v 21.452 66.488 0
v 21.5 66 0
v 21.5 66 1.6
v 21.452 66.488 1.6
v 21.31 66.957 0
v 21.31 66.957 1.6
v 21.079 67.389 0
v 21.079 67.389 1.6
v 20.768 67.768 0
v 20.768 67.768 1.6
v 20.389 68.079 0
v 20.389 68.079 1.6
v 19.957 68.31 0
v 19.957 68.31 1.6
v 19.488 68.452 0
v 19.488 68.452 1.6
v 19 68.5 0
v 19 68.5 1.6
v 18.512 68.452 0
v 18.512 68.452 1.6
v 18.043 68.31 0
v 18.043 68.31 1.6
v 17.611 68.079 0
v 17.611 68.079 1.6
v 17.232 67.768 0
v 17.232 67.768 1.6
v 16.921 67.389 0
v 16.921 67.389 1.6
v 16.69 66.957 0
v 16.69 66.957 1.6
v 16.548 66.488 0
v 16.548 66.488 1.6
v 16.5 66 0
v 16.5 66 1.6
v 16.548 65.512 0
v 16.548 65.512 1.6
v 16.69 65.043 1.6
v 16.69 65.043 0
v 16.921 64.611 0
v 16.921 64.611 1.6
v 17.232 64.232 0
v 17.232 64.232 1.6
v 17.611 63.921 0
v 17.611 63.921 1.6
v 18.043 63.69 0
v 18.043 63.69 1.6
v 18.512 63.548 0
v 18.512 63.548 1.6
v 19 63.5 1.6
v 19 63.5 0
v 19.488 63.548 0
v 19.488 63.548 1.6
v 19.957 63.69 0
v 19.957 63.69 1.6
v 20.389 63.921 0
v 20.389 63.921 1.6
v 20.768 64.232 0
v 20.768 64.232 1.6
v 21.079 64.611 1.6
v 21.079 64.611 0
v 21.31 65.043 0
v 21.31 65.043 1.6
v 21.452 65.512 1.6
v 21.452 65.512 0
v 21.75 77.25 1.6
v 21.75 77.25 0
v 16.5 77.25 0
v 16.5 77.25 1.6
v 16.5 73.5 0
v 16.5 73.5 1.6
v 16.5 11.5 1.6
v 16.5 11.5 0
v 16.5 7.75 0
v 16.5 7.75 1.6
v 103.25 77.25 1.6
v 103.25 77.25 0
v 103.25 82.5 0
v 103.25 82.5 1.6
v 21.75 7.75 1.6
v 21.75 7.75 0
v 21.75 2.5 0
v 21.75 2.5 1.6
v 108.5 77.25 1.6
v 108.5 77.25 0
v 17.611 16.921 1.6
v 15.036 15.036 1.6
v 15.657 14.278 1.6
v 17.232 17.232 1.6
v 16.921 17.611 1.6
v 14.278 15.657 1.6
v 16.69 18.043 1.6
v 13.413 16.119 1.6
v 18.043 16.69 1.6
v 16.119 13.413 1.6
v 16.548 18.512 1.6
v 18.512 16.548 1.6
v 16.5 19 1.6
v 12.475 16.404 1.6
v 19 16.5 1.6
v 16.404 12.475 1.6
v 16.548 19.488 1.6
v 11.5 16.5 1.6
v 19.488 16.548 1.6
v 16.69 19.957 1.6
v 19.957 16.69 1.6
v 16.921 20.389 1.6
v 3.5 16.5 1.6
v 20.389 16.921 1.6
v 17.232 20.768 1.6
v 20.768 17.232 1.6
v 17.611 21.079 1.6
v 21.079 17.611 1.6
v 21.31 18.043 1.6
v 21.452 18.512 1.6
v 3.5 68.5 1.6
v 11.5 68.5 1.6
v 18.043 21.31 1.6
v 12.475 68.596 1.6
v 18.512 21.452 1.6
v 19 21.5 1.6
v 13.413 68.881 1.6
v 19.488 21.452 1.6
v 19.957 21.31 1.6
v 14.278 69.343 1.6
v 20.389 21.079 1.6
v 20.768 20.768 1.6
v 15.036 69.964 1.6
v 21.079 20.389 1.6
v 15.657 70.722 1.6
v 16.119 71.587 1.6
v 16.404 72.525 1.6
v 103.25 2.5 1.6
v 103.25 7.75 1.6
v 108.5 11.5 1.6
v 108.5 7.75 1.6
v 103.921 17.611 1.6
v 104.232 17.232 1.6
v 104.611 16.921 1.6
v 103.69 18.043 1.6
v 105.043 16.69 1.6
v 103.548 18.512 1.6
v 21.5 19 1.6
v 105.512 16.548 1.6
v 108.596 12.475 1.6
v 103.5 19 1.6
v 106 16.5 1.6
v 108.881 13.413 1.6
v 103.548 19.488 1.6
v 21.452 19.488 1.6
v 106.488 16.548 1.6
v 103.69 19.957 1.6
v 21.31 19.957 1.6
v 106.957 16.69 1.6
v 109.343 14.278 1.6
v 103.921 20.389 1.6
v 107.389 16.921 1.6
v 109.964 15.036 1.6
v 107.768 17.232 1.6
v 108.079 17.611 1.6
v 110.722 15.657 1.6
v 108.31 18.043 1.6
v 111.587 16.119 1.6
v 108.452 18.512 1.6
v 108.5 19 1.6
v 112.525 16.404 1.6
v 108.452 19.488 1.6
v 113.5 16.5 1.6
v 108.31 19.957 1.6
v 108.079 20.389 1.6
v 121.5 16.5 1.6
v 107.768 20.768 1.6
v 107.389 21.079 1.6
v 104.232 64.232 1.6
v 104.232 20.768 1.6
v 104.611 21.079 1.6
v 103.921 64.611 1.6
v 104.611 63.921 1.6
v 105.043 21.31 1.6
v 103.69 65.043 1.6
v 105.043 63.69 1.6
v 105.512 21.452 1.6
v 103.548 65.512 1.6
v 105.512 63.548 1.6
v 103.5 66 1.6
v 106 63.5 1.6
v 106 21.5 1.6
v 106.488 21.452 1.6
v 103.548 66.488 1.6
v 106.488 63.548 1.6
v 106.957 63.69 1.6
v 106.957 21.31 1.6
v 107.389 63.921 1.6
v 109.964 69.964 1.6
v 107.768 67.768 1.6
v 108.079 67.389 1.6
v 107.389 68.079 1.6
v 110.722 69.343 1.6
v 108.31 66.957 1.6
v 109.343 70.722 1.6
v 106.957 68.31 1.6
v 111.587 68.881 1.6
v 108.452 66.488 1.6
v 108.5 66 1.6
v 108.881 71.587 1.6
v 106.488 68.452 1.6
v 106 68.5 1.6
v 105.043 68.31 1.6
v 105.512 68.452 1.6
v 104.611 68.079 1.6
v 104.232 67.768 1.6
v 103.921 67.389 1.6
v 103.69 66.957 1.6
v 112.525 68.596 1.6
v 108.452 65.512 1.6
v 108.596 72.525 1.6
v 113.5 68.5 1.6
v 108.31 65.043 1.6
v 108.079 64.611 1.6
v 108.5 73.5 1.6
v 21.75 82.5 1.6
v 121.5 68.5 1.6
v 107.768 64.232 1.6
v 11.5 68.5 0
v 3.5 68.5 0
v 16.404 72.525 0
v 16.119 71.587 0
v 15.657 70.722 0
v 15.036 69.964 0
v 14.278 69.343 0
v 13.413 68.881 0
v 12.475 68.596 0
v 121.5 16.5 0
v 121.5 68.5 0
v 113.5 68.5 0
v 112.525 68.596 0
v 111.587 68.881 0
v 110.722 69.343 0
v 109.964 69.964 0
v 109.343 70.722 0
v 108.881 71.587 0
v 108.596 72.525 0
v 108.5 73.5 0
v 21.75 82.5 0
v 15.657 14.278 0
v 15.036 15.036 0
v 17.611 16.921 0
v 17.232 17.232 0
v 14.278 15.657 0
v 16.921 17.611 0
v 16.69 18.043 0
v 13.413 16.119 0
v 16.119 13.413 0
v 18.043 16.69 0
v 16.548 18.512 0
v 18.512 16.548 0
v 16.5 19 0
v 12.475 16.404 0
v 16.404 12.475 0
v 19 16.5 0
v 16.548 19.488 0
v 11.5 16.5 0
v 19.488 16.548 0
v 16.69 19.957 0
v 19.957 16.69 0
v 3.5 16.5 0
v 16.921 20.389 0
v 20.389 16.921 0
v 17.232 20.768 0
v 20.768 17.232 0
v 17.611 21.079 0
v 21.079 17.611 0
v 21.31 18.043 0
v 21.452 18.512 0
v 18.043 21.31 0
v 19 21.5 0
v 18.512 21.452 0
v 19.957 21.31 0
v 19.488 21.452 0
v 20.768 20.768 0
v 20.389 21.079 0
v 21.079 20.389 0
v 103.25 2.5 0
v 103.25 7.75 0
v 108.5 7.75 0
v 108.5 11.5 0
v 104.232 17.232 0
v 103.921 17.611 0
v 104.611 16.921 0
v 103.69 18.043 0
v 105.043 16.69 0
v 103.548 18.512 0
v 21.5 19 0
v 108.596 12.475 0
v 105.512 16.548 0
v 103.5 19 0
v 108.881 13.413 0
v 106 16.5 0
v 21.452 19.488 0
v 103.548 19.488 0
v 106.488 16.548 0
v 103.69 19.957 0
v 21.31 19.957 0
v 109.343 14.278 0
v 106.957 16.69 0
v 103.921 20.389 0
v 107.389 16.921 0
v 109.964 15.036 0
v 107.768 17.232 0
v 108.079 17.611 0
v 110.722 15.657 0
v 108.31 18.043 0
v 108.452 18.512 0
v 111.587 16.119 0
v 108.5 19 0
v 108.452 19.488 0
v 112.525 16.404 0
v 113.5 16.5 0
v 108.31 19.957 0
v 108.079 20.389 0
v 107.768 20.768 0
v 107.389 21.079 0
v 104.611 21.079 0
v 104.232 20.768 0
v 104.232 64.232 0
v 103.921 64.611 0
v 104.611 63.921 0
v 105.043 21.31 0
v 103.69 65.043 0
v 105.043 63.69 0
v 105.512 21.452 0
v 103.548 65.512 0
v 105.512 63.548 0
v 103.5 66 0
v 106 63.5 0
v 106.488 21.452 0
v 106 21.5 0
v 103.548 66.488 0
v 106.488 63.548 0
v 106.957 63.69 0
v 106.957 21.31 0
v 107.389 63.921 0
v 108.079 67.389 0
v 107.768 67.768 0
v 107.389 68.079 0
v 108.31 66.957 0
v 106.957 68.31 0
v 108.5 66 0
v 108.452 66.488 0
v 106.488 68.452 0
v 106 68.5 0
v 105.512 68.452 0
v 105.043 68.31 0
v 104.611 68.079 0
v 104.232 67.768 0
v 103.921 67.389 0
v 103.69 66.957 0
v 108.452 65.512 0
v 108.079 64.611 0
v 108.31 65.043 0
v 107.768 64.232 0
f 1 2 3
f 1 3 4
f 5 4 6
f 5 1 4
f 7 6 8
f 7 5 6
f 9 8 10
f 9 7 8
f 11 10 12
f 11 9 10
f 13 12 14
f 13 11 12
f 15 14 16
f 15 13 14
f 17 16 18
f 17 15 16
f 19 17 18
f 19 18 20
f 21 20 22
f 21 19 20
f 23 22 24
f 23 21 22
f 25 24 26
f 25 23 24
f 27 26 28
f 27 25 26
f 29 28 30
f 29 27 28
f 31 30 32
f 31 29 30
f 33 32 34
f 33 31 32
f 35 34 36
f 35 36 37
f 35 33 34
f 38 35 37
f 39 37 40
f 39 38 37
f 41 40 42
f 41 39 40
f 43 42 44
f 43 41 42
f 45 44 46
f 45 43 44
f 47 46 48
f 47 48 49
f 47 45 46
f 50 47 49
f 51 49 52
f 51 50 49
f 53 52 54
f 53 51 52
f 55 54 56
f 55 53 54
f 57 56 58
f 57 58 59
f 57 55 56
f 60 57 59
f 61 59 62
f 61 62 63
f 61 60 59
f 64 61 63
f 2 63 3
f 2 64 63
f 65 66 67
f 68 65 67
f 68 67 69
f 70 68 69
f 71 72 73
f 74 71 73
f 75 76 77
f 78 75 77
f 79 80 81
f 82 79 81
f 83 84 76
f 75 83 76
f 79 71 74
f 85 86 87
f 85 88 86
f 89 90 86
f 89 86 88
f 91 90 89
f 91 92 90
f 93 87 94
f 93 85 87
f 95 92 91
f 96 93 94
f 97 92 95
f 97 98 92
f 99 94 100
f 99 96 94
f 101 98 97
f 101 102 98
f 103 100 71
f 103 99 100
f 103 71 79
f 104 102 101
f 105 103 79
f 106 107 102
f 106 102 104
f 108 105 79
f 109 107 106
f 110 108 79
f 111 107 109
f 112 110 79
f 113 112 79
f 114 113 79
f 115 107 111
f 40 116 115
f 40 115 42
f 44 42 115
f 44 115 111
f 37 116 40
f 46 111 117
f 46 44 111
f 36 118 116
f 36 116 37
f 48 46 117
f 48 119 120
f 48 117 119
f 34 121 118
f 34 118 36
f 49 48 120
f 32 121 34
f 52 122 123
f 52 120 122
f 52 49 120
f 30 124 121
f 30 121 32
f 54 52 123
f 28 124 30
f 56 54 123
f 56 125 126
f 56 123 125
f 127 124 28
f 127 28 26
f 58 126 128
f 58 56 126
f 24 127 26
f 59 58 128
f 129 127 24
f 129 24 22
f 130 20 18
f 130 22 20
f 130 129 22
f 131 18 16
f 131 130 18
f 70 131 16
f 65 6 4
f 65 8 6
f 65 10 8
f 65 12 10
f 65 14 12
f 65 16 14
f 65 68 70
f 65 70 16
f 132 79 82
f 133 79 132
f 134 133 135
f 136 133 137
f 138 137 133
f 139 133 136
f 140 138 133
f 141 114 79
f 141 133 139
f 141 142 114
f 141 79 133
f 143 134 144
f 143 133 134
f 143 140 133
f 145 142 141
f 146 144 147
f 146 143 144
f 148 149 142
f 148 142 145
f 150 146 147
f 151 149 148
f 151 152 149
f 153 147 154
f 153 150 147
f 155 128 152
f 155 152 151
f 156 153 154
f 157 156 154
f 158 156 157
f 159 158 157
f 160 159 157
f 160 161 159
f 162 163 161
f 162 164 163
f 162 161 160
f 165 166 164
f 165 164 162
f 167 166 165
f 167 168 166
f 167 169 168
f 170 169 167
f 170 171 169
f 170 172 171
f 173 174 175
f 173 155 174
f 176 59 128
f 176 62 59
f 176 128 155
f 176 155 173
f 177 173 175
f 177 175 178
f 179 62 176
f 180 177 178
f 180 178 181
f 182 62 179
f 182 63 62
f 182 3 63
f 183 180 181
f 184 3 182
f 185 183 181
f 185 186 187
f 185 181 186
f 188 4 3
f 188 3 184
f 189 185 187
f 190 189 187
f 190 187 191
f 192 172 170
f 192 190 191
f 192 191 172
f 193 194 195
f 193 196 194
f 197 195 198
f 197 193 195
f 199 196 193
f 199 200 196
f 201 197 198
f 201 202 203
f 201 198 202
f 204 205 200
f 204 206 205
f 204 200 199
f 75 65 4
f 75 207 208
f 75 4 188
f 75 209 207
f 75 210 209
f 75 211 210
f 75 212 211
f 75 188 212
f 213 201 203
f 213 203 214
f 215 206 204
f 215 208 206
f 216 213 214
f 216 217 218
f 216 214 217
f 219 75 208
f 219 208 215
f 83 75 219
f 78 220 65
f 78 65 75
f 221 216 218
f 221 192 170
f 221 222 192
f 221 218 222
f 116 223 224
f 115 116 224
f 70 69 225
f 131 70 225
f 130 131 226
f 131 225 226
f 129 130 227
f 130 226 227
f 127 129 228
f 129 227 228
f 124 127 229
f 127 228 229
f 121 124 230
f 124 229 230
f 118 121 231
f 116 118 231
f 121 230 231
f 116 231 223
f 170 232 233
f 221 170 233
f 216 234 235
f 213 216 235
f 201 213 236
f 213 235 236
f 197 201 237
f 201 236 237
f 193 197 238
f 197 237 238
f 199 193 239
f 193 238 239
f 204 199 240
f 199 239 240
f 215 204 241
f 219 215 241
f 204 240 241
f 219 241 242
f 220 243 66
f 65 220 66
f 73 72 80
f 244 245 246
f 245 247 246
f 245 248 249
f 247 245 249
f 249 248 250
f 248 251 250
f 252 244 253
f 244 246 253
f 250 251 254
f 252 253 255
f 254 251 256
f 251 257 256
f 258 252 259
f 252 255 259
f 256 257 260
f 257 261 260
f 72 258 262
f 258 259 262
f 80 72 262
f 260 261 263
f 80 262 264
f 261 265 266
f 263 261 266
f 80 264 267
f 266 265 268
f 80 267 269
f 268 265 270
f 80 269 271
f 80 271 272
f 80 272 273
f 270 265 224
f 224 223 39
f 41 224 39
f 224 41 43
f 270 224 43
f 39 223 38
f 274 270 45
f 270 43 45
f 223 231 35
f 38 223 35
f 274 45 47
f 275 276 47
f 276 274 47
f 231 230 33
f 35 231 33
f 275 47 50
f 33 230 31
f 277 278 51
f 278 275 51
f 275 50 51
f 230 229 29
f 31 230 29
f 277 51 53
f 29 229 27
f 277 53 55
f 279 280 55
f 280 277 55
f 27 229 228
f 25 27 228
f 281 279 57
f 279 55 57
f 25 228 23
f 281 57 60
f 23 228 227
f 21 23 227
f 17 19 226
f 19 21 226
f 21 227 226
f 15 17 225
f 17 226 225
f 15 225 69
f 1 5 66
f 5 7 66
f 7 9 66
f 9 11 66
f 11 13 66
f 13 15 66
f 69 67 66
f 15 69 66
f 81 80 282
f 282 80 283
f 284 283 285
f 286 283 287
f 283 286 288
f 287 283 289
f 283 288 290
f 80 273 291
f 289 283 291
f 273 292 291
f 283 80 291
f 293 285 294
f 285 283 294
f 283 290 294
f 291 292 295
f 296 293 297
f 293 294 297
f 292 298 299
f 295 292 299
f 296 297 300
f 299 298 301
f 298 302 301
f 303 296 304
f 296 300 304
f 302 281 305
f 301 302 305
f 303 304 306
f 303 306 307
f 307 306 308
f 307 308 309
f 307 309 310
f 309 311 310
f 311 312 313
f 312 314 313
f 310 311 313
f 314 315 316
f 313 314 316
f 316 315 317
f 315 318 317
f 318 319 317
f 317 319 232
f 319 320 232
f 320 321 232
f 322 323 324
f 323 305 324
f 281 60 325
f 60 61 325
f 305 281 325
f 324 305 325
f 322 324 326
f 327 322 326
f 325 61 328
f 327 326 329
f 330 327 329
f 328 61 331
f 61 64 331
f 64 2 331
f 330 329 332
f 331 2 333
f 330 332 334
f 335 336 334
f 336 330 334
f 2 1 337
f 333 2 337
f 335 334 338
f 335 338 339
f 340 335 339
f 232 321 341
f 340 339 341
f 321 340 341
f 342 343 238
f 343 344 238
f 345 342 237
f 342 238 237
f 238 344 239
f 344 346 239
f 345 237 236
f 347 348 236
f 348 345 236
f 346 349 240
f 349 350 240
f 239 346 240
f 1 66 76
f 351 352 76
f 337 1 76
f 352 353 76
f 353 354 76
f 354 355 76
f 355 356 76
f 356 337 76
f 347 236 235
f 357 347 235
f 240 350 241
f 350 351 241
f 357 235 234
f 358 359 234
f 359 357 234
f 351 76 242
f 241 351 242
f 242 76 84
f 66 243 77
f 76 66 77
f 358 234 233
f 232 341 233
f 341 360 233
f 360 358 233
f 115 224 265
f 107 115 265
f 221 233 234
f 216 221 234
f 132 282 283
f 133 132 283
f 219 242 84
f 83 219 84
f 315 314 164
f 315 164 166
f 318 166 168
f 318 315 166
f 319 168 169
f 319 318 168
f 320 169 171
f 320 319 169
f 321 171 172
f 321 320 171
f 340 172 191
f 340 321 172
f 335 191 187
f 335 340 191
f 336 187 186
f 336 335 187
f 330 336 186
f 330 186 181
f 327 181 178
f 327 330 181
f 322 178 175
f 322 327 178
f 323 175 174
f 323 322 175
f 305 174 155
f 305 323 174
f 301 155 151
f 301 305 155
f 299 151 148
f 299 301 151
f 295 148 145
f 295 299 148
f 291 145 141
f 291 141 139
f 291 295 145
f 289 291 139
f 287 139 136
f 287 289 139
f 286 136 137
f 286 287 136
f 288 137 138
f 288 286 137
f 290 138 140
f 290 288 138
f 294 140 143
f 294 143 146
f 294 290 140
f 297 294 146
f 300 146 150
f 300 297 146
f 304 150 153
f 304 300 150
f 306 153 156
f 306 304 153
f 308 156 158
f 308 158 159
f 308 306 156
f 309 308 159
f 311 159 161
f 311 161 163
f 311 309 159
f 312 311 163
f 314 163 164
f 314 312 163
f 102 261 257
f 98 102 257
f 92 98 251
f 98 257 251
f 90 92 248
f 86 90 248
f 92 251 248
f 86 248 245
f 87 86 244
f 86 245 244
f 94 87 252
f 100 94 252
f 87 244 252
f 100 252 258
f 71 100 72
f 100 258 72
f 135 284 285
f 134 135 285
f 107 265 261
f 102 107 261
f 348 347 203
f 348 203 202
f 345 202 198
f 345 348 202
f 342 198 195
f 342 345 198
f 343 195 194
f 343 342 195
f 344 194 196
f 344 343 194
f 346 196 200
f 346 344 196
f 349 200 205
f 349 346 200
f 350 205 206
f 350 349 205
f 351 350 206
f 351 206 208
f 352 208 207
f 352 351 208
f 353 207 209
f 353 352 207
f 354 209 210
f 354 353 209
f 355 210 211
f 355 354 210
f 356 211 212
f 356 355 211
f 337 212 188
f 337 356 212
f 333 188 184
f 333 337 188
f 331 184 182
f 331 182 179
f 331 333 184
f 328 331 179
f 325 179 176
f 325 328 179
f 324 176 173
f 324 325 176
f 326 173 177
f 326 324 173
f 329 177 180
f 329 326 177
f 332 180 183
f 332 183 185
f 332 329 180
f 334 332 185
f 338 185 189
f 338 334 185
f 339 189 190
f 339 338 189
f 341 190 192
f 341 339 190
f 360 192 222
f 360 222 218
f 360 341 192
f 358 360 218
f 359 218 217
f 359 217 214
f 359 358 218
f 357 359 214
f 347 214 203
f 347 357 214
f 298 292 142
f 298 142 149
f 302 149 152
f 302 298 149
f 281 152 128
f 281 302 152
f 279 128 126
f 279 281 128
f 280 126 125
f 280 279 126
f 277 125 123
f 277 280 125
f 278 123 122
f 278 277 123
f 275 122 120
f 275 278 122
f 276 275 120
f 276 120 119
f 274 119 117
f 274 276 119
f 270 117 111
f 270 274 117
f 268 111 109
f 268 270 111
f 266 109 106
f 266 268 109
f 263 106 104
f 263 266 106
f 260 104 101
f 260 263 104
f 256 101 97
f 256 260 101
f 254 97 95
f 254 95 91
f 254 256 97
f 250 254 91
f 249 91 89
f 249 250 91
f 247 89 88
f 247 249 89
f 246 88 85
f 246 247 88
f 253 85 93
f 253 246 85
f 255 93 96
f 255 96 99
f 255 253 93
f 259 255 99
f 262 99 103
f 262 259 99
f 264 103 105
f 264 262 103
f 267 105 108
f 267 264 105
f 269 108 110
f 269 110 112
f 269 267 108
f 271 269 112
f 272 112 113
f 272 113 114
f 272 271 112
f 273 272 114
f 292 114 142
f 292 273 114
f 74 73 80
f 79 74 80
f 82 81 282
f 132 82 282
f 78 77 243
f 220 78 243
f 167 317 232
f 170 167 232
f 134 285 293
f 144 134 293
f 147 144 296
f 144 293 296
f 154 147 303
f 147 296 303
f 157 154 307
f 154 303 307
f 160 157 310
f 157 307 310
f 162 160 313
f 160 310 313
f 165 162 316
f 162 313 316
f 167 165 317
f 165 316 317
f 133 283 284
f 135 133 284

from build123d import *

# Parameters (mm, degrees)
F0_R     = 2.5
F1_DEPTH = 1.6


with BuildPart() as f1:
    # F0 (on Top) → F1 (new body)
    with BuildSketch(Plane.XY):
        with BuildLine():
            ThreePointArc((16.5, 73.5), (15.035534, 69.964466), (11.5, 68.5))
            Line((11.5, 68.5), (3.5, 68.5))
            Line((3.5, 68.5), (3.5, 16.5))
            Line((3.5, 16.5), (11.5, 16.5))
            ThreePointArc((11.5, 16.5), (15.035534, 15.035534), (16.5, 11.5))
            Line((16.5, 11.5), (16.5, 7.75))
            Line((16.5, 7.75), (21.75, 7.75))
            Line((21.75, 7.75), (21.75, 4))
            Line((21.75, 4), (21.75, 2.5))
            Line((21.75, 2.5), (103.25, 2.5))
            Line((103.25, 2.5), (103.25, 4))
            Line((103.25, 4), (103.25, 7.75))
            Line((103.25, 7.75), (108.5, 7.75))
            Line((108.5, 7.75), (108.5, 11.5))
            ThreePointArc((108.5, 11.5), (109.964466, 15.035534), (113.5, 16.5))
            Line((113.5, 16.5), (121.5, 16.5))
            Line((121.5, 16.5), (121.5, 68.5))
            Line((121.5, 68.5), (113.5, 68.5))
            ThreePointArc((113.5, 68.5), (109.964466, 69.964466), (108.5, 73.5))
            Line((108.5, 73.5), (108.5, 77.25))
            Line((108.5, 77.25), (103.25, 77.25))
            Line((103.25, 77.25), (103.25, 81))
            Line((103.25, 81), (103.25, 82.5))
            Line((103.25, 82.5), (21.75, 82.5))
            Line((21.75, 82.5), (21.75, 81))
            Line((21.75, 81), (21.75, 77.25))
            Line((21.75, 77.25), (16.5, 77.25))
            Line((16.5, 77.25), (16.5, 73.5))
        make_face()
        with Locations((19, 19)):
            Circle(F0_R, mode=Mode.SUBTRACT)
        with Locations((106, 19)):
            Circle(F0_R, mode=Mode.SUBTRACT)
        with Locations((19, 66)):
            Circle(F0_R, mode=Mode.SUBTRACT)
        with Locations((106, 66)):
            Circle(F0_R, mode=Mode.SUBTRACT)
    extrude(amount=F1_DEPTH)


solid = f1.part
